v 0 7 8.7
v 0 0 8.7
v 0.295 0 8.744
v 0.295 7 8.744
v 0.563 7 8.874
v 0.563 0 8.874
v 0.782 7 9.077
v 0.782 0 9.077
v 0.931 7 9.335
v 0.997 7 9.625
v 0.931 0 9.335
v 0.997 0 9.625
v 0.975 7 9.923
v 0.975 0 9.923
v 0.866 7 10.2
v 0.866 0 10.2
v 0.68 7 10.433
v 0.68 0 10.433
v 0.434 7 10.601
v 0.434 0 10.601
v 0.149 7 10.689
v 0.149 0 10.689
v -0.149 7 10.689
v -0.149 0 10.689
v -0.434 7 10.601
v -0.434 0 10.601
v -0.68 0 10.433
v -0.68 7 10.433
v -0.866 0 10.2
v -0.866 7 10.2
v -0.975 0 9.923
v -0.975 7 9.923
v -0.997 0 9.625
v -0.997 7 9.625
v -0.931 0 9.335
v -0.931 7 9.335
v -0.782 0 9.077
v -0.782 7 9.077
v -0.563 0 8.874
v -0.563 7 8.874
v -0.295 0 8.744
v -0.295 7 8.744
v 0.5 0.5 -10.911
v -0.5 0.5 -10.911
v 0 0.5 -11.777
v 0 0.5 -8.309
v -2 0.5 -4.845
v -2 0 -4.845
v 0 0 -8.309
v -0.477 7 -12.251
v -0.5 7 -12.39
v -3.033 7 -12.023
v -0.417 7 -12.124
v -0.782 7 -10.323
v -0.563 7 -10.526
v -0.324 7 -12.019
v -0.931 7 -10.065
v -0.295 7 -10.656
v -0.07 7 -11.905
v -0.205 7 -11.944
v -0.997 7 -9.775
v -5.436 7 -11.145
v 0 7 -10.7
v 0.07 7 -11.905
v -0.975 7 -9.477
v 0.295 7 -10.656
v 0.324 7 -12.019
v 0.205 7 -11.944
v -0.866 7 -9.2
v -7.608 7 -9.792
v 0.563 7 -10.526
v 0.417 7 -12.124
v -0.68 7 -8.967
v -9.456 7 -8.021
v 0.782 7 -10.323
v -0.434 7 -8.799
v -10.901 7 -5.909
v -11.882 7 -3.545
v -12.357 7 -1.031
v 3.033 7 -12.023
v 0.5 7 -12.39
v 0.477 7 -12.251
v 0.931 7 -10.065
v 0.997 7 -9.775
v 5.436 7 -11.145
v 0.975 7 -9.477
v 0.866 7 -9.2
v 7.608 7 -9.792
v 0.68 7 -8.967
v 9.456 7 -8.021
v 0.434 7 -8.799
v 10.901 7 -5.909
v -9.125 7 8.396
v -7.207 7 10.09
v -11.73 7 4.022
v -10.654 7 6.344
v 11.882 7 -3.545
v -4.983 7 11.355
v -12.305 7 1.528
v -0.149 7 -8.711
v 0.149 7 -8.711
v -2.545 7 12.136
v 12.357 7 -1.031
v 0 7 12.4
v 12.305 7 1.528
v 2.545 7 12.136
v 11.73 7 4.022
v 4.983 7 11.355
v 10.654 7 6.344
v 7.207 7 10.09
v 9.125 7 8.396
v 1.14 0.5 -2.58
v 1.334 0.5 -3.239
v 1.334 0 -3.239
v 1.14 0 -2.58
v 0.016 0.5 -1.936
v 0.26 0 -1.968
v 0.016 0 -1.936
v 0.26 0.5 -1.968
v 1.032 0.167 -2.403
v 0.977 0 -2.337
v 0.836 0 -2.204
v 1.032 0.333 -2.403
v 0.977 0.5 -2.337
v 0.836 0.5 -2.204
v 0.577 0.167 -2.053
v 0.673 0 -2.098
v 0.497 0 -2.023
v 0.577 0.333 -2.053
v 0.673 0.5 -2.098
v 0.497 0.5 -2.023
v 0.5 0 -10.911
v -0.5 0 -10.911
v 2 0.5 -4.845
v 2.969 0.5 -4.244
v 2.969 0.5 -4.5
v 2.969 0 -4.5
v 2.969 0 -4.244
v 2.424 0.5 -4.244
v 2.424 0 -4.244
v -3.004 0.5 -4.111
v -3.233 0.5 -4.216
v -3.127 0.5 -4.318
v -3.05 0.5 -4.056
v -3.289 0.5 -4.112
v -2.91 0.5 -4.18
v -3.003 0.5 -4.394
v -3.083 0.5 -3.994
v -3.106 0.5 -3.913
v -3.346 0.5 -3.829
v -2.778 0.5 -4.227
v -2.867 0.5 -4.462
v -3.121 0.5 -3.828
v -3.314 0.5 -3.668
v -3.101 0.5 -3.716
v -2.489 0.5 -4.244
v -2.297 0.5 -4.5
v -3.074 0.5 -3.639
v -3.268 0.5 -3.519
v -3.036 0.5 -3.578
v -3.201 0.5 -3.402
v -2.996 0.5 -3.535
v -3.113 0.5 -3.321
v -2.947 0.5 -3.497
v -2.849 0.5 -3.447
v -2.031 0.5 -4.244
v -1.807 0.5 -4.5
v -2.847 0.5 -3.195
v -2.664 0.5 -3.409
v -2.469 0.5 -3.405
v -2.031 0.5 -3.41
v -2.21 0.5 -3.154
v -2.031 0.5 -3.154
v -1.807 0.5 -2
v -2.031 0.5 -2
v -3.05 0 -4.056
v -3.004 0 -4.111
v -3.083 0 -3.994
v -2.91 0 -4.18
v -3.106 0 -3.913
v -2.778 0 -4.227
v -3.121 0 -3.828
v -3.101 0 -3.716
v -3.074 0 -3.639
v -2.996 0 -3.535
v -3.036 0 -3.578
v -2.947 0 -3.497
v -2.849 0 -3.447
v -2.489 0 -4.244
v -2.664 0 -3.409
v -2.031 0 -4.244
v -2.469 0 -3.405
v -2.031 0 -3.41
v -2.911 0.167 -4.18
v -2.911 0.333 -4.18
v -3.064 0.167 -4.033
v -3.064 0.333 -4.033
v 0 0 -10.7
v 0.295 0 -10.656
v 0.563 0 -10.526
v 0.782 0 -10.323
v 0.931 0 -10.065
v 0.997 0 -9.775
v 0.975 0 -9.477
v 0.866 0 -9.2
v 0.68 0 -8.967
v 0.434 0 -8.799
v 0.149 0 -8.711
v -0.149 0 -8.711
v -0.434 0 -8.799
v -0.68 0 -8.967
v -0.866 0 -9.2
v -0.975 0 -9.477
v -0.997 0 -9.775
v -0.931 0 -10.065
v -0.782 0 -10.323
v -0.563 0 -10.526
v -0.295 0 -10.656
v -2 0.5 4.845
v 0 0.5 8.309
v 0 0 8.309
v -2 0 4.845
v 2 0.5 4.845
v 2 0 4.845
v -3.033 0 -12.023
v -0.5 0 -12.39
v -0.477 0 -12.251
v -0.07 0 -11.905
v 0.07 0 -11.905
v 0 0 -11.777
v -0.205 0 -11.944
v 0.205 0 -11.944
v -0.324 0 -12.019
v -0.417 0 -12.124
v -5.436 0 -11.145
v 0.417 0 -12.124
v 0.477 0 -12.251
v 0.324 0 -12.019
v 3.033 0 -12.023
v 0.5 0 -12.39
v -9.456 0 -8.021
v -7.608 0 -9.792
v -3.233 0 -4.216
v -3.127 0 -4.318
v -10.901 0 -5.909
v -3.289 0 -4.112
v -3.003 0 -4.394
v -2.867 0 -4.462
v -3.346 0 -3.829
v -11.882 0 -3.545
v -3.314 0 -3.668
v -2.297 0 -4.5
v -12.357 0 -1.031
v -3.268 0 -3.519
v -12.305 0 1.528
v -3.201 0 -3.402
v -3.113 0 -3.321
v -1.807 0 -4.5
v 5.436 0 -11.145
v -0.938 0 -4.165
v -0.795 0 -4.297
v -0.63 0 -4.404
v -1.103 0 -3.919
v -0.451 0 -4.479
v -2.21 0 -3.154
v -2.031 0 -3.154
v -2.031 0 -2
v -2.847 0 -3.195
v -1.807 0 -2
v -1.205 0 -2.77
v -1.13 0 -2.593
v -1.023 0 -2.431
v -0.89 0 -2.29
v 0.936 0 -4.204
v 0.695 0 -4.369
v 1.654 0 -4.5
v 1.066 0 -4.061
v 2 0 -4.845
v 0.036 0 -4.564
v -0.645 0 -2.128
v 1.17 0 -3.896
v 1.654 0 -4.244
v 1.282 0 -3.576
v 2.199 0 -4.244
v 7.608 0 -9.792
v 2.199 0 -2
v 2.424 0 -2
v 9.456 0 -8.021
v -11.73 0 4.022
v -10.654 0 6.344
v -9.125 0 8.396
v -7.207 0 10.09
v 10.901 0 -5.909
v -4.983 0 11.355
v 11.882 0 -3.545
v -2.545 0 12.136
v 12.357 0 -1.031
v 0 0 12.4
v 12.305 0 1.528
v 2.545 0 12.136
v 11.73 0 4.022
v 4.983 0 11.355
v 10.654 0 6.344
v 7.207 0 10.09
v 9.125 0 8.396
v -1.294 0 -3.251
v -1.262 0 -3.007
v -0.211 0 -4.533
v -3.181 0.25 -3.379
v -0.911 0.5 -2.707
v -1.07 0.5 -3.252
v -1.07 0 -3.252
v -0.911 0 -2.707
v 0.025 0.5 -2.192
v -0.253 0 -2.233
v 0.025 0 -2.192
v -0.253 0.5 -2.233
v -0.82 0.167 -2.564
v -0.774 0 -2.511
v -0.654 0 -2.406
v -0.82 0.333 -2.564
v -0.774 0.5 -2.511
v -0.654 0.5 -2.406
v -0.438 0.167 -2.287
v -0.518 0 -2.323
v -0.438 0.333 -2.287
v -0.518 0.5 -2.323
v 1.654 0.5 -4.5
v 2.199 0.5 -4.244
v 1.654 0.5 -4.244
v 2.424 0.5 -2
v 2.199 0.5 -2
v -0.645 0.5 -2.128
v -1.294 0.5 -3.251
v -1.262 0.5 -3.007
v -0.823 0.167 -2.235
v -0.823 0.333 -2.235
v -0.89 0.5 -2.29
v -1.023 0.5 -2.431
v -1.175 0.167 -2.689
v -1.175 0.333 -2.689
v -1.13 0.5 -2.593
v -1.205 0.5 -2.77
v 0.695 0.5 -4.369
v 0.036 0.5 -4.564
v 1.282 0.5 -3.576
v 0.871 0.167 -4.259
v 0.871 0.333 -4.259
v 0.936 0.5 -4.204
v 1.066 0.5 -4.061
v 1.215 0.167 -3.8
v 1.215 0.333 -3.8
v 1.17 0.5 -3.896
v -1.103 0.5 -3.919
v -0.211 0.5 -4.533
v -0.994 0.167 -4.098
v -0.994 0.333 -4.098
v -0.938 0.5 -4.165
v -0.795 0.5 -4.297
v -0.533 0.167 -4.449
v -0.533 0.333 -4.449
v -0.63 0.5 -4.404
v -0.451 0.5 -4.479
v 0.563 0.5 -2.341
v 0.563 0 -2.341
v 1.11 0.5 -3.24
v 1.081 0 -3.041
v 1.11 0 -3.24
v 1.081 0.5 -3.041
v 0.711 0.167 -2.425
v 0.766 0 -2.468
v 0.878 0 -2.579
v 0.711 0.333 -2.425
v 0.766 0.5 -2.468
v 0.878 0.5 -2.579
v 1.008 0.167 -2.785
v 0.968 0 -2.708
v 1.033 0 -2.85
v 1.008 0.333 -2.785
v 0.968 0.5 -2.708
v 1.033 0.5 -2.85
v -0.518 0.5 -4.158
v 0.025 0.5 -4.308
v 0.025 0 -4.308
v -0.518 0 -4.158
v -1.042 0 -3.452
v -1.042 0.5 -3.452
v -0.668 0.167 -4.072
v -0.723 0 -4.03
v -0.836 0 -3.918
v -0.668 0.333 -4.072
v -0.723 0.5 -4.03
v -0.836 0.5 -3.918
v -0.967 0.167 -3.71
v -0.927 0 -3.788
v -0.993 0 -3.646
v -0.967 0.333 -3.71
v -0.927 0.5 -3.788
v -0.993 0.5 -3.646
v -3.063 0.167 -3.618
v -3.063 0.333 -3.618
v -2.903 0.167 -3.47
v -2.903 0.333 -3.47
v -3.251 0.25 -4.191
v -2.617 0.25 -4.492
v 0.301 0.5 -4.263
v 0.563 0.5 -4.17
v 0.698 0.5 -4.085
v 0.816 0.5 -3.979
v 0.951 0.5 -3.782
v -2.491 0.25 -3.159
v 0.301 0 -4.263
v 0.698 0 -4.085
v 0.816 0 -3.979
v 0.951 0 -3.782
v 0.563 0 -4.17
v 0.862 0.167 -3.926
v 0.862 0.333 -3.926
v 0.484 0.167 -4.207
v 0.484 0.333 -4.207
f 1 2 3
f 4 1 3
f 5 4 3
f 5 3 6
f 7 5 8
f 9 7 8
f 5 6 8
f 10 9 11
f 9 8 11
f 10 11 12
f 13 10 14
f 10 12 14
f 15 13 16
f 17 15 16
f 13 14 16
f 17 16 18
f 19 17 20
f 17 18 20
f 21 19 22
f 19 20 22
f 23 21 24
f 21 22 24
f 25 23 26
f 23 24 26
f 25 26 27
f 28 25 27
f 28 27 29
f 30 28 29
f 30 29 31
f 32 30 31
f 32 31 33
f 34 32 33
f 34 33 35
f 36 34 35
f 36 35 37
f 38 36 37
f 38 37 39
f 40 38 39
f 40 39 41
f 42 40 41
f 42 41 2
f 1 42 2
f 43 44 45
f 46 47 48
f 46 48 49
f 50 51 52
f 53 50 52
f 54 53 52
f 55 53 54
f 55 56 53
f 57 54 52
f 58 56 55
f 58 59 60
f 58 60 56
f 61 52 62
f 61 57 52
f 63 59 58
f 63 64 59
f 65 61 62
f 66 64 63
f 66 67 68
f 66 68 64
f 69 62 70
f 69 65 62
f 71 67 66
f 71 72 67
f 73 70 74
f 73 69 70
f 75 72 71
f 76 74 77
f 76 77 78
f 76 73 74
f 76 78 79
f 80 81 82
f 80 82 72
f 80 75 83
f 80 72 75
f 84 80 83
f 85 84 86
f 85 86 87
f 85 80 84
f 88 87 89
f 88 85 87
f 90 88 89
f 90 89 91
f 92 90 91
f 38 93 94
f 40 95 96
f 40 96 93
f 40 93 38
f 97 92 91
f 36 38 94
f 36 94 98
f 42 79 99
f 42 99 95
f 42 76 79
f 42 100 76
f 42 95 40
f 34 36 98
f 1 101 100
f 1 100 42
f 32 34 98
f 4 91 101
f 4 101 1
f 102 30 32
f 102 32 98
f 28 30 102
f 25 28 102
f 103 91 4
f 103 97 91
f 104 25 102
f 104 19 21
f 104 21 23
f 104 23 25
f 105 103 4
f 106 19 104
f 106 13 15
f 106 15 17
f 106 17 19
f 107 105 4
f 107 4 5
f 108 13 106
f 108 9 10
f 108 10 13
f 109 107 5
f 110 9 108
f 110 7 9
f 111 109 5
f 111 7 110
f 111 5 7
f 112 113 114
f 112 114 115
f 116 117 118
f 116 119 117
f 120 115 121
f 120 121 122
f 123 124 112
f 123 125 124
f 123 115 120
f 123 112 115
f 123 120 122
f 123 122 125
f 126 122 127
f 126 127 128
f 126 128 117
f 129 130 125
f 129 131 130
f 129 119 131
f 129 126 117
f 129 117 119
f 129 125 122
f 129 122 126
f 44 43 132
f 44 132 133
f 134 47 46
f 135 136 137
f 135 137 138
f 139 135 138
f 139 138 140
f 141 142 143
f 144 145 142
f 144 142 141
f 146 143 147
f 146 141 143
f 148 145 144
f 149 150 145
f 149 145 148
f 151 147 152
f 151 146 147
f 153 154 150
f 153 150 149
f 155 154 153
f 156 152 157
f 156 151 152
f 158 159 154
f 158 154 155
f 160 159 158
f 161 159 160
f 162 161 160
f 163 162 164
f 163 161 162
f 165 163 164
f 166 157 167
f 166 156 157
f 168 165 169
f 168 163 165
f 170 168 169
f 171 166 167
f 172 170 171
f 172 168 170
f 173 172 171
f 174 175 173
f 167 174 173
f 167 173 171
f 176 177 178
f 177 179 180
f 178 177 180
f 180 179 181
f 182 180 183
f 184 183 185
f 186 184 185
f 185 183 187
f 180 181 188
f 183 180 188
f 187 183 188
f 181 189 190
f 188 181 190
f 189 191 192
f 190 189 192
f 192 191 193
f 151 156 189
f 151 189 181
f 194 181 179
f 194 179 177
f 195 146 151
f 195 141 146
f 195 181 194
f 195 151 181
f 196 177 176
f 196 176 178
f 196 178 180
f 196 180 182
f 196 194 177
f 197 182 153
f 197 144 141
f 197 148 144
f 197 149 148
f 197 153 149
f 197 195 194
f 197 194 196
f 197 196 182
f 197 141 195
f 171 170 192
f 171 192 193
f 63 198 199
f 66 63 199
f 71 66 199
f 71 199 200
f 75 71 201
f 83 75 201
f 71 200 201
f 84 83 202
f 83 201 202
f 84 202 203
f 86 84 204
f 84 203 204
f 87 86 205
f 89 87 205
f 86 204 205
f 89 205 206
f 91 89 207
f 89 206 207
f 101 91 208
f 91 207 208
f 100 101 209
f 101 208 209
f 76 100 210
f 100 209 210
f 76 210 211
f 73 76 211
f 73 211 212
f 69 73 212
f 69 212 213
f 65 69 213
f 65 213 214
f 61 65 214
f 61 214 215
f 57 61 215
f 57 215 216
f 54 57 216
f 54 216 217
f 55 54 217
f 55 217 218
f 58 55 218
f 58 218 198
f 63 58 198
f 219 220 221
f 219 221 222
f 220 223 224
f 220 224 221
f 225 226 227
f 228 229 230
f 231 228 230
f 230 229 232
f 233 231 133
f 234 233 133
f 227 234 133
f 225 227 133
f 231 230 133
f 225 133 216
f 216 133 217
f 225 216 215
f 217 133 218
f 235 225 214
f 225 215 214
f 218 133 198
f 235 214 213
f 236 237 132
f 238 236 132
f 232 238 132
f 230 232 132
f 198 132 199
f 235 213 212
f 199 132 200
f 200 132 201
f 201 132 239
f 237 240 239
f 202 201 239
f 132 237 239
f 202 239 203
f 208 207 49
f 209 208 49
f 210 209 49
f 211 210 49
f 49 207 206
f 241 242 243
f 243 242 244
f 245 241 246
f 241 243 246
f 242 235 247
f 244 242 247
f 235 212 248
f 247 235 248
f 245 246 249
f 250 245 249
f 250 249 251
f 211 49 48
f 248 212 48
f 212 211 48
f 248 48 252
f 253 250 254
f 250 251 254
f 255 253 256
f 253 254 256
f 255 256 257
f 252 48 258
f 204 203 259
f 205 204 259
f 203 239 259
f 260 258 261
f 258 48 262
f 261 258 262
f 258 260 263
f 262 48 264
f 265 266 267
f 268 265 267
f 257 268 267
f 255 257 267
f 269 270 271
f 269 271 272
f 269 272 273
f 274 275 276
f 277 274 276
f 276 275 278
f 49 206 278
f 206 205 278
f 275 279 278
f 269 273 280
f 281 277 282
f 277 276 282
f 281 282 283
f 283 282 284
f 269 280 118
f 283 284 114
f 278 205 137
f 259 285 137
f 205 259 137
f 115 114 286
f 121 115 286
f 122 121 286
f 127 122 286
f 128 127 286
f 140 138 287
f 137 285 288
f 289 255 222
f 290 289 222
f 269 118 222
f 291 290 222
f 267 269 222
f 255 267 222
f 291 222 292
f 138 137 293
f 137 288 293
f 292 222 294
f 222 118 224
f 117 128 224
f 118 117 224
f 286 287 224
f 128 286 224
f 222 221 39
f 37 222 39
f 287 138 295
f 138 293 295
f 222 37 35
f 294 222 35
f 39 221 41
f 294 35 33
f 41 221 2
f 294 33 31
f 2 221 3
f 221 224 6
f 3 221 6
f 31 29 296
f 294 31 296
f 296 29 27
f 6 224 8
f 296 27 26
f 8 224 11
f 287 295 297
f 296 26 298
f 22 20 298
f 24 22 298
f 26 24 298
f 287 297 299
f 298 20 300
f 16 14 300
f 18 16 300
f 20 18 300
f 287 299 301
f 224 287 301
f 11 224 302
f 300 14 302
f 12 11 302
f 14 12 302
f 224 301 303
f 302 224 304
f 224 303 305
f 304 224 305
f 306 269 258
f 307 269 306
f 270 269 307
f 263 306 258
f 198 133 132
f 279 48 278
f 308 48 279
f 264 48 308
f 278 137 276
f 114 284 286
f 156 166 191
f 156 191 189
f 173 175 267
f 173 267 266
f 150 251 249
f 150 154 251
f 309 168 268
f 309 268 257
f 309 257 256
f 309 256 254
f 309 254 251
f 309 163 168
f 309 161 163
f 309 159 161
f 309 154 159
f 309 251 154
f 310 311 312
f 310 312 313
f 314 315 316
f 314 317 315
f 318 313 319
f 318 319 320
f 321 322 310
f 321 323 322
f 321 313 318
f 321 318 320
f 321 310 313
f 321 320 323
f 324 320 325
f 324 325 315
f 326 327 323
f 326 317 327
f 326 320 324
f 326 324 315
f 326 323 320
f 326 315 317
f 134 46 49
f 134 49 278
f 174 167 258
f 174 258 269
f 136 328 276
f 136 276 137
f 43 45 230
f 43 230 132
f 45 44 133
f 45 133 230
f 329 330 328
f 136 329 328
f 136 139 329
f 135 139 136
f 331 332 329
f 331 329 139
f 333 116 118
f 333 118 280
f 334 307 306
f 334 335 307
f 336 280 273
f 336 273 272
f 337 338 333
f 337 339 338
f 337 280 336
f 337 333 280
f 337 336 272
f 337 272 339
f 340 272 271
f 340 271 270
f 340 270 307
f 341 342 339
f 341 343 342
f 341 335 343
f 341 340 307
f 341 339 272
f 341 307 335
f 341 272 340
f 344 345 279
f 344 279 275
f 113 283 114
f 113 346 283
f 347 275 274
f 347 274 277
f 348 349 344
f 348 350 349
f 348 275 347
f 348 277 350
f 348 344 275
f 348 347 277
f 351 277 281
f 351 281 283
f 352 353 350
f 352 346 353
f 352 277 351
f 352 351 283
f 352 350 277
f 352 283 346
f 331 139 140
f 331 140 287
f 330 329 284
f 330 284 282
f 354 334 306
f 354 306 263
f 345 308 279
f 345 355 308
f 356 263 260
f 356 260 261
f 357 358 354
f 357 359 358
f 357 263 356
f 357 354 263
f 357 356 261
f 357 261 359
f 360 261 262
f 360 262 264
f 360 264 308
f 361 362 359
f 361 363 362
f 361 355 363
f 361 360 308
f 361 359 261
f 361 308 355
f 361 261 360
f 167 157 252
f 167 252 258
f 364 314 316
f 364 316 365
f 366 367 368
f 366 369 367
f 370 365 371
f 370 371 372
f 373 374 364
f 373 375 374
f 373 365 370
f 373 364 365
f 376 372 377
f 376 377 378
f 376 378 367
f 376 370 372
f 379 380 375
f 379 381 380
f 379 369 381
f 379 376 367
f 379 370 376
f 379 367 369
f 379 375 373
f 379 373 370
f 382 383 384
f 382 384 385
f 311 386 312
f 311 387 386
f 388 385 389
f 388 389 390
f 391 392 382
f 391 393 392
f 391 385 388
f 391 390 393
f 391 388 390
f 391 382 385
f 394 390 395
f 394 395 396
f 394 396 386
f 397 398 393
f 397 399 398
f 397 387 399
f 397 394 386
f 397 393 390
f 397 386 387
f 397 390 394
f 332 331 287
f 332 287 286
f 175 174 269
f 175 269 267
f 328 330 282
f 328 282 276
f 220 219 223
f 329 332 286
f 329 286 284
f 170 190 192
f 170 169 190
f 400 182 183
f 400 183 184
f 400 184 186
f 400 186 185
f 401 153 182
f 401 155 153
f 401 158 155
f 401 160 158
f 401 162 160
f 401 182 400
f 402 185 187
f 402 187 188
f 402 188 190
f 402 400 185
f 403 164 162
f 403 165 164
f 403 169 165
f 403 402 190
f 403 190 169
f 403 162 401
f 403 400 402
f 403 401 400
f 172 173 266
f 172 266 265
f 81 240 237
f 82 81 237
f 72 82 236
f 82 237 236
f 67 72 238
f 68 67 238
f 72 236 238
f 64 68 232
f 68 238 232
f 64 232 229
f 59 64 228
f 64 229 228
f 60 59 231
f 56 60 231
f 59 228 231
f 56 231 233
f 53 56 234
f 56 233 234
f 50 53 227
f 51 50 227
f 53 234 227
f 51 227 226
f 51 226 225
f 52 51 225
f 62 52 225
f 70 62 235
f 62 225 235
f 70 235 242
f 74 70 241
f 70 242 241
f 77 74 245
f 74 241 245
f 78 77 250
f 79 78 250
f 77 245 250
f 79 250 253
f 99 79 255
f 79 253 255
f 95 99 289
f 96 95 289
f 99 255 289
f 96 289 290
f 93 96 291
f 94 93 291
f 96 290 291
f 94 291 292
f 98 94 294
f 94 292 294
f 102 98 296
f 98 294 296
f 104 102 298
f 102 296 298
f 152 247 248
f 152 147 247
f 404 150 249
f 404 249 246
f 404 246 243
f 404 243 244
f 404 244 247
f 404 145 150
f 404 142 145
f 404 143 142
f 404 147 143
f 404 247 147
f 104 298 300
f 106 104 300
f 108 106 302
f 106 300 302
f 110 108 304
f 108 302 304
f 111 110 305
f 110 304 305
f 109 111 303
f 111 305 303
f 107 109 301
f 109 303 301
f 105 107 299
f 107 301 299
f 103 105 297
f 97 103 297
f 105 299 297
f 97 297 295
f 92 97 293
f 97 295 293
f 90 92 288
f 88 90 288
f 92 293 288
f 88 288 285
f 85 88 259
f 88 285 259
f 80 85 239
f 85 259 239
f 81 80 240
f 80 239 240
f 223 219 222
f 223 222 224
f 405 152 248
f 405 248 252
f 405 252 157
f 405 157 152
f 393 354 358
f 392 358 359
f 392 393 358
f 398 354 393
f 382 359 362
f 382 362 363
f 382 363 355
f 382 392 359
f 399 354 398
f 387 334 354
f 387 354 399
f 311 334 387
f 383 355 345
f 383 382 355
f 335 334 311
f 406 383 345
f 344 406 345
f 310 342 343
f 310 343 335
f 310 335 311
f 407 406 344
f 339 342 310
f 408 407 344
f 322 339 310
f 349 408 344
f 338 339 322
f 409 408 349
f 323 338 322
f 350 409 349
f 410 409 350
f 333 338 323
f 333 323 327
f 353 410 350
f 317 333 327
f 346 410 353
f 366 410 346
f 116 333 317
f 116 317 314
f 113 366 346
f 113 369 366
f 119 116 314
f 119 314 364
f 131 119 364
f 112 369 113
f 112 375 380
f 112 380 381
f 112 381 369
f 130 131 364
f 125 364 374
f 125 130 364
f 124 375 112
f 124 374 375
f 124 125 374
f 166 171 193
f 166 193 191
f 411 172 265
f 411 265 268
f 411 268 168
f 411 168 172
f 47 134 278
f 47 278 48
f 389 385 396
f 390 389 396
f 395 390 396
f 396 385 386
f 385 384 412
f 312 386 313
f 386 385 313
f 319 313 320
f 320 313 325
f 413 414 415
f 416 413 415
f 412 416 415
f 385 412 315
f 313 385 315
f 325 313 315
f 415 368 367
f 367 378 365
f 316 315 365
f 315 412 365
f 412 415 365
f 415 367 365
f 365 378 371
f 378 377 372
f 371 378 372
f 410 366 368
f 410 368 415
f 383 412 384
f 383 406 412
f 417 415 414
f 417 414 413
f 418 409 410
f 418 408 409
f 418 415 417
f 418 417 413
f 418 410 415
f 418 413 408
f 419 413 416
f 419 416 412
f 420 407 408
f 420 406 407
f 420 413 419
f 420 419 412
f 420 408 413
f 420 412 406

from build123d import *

# Parameters (mm, degrees)
SKETCH1_R           = 12.4
BOSS_EXTRUDE1_DEPTH = 7
SKETCH2_R           = 1
CUT_EXTRUDE1_DEPTH  = 19.881737208
WRAP1_START         = -0.5
WRAP1_DEPTH         = 0.5
SKETCH4_R           = 0.5
CUT_EXTRUDE2_DEPTH  = 7


# Read off the part's stored shape, not the designer's step: Wrap1
with BuildPart() as part:
    # Sketch1 → Boss-Extrude1 (new body)
    with BuildSketch(Plane(origin=(0, 0, 0), x_dir=(1, 0, 0), z_dir=(0, 1, 0))):
        with Locations(Location((0, 0, 0), (0, 0, 270))):
            Circle(SKETCH1_R)
    extrude(amount=BOSS_EXTRUDE1_DEPTH)

    # Sketch2 → Cut-Extrude1 (cut, through all)
    with BuildSketch(Plane(origin=(0, 0, 0), x_dir=(-1, 0, 0), z_dir=(0, -1, 0))):
        with Locations(Location((0, 9.7, 0), (0, 0, 90))):
            Circle(SKETCH2_R)
        with Locations(Location((0, -9.7, 0), (0, 0, 90))):
            Circle(SKETCH2_R)
    extrude(amount=-CUT_EXTRUDE1_DEPTH, mode=Mode.SUBTRACT)

    # Wrap1 outline → Wrap1 (cut)
    # profile 1 of 6: a face of its own
    with BuildSketch(Plane.XZ.offset(WRAP1_START)):
        with BuildLine():
            Line((-2.031477868, -3.153846154), (-2.210263925, -3.153846154))
            add(Edge.make_bspline(
                [(-2.210263925, -3.153846154), (-2.304050451, -3.153758336), (-2.51704944, -3.153558894), (-2.728459302, -3.180072549), (-2.846782355, -3.194911859)],
                knots=[0, 0, 0, 0, 0.440314414, 1, 1, 1, 1], degree=3))
            add(Edge.make_bspline(
                [(-2.846782355, -3.194911859), (-2.973262529, -3.243260598), (-3.258825144, -3.352420729), (-3.314541645, -3.658766612), (-3.345580432, -3.829427083)],
                knots=[0, 0, 0, 0, 0.442915733, 1, 1, 1, 1], degree=3))
            add(Edge.make_bspline(
                [(-3.345580432, -3.829427083), (-3.329443977, -3.960601874), (-3.292993392, -4.25691217), (-3.019329137, -4.388888631), (-2.866814406, -4.462439904)],
                knots=[0, 0, 0, 0, 0.442694001, 1, 1, 1, 1], degree=3))
            add(Edge.make_bspline(
                [(-2.866814406, -4.462439904), (-2.783809352, -4.4741997), (-2.595026902, -4.500945579), (-2.404280932, -4.500339561), (-2.297403348, -4.5)],
                knots=[0, 0, 0, 0, 0.439686282, 1, 1, 1, 1], degree=3))
            Line((-2.297403348, -4.5), (-1.807118893, -4.5))
            Line((-1.807118893, -4.5), (-1.807118893, -2))
            Line((-1.807118893, -2), (-2.031477868, -2))
            Line((-2.031477868, -2), (-2.031477868, -3.153846154))
        make_face()
        with BuildLine():
            Line((-2.031477868, -4.243589744), (-2.488709438, -4.243589744))
            add(Edge.make_bspline(
                [(-2.488709438, -4.243589744), (-2.636778663, -4.245832648), (-2.858668728, -4.249193765), (-3.087398478, -4.043591474), (-3.109947004, -3.900148285), (-3.121221457, -3.828425481)],
                knots=[0, 0, 0, 0, 0.500718692, 0.750355136, 1, 1, 1, 1], degree=3))
            add(Edge.make_bspline(
                [(-3.121221457, -3.828425481), (-3.110084042, -3.754426269), (-3.087818883, -3.606492103), (-2.846982746, -3.401705038), (-2.620432253, -3.403529508), (-2.469178188, -3.404747596)],
                knots=[0, 0, 0, 0, 0.249615048, 0.499013341, 1, 1, 1, 1], degree=3))
            Line((-2.469178188, -3.404747596), (-2.031477868, -3.41025641))
            Line((-2.031477868, -3.41025641), (-2.031477868, -4.243589744))
        make_face(mode=Mode.SUBTRACT)
    # profile 2 of 6: a face of its own
    with BuildSketch(Plane.XZ.offset(WRAP1_START)):
        with BuildLine():
            add(Edge.make_bspline(
                [(-1.29429838, -3.251001603), (-1.233767931, -3.555711086), (-1.13419239, -4.056973037), (-0.546785242, -4.501043755), (-0.158404316, -4.54307981), (0.035829825, -4.564102564)],
                knots=[0, 0, 0, 0, 0.436607301, 0.718240291, 1, 1, 1, 1], degree=3))
            add(Edge.make_bspline(
                [(0.035829825, -4.564102564), (0.337186775, -4.501451173), (0.832784511, -4.398417587), (1.263646175, -3.813137767), (1.310482432, -3.430401214), (1.333906748, -3.238982372)],
                knots=[0, 0, 0, 0, 0.436786424, 0.718318801, 1, 1, 1, 1], degree=3))
            add(Edge.make_bspline(
                [(1.333906748, -3.238982372), (1.271523902, -2.938761966), (1.168876948, -2.444768626), (0.592223534, -2.001267596), (0.207932181, -1.957686637), (0.015797773, -1.935897436)],
                knots=[0, 0, 0, 0, 0.436529586, 0.718281316, 1, 1, 1, 1], degree=3))
            add(Edge.make_bspline(
                [(0.015797773, -1.935897436), (-0.285288336, -1.99709136), (-0.780661114, -2.09777287), (-1.227049335, -2.673889596), (-1.271884529, -3.058652359), (-1.29429838, -3.251001603)],
                knots=[0, 0, 0, 0, 0.436613243, 0.71835368, 1, 1, 1, 1], degree=3))
        make_face()
        with BuildLine():
            add(Edge.make_bspline(
                [(0.024812197, -4.307692308), (-0.222096477, -4.260150518), (-0.627501361, -4.182090587), (-1.011681906, -3.724534497), (-1.050518548, -3.409193504), (-1.069939406, -3.251502404)],
                knots=[0, 0, 0, 0, 0.437825955, 0.718876246, 1, 1, 1, 1], degree=3))
            add(Edge.make_bspline(
                [(-1.069939406, -3.251502404), (-1.019780636, -3.002340488), (-0.937269286, -2.592468281), (-0.447437557, -2.247759346), (-0.132657177, -2.210797775), (0.024812197, -2.192307692)],
                knots=[0, 0, 0, 0, 0.43655613, 0.718136331, 1, 1, 1, 1], degree=3))
            add(Edge.make_bspline(
                [(0.024812197, -2.192307692), (0.269360953, -2.239222325), (0.671380896, -2.316346488), (1.051425571, -2.770762078), (1.090179676, -3.083624875), (1.109547773, -3.239983974)],
                knots=[0, 0, 0, 0, 0.437205081, 0.718732595, 1, 1, 1, 1], degree=3))
            add(Edge.make_bspline(
                [(1.109547773, -3.239983974), (1.059317235, -3.487706151), (0.97667219, -3.89528709), (0.494781539, -4.245984232), (0.181454127, -4.287124855), (0.024812197, -4.307692308)],
                knots=[0, 0, 0, 0, 0.436595419, 0.718336864, 1, 1, 1, 1], degree=3))
        make_face(mode=Mode.SUBTRACT)
    # profile 3 of 6: a face of its own
    with BuildSketch(Plane.XZ.offset(WRAP1_START)):
        Polygon((1.654419568, -4.5), (2.968522132, -4.5), (2.968522132, -4.243589744), (2.423650338, -4.243589744), (2.423650338, -2), (2.199291363, -2), (2.199291363, -4.243589744), (1.654419568, -4.243589744), align=None)
    # profile 4 of 6: a face of its own
    with BuildSketch(Plane.XZ.offset(WRAP1_START)):
        Polygon((0, -8.309401077), (2, -4.845299462), (-2, -4.845299462), align=None)
    # profile 5 of 6: a face of its own
    with BuildSketch(Plane.XZ.offset(WRAP1_START)):
        Polygon((-2, 4.845299462), (2, 4.845299462), (0, 8.309401077), align=None)
    # profile 6 of 6: a face of its own
    with BuildSketch(Plane.XZ.offset(WRAP1_START)):
        Polygon((0, -11.777350269), (0.5, -10.911324865), (-0.5, -10.911324865), align=None)
    extrude(amount=WRAP1_DEPTH, mode=Mode.SUBTRACT)

    # Sketch4 → Cut-Extrude2 (cut)
    with BuildSketch(Plane(origin=(0, 0, 0), x_dir=(-1, 0, 0), z_dir=(0, -1, 0))):
        with Locations((0, 12.4)):
            Circle(SKETCH4_R)
    extrude(amount=-CUT_EXTRUDE2_DEPTH, mode=Mode.SUBTRACT)


solid = part.part
